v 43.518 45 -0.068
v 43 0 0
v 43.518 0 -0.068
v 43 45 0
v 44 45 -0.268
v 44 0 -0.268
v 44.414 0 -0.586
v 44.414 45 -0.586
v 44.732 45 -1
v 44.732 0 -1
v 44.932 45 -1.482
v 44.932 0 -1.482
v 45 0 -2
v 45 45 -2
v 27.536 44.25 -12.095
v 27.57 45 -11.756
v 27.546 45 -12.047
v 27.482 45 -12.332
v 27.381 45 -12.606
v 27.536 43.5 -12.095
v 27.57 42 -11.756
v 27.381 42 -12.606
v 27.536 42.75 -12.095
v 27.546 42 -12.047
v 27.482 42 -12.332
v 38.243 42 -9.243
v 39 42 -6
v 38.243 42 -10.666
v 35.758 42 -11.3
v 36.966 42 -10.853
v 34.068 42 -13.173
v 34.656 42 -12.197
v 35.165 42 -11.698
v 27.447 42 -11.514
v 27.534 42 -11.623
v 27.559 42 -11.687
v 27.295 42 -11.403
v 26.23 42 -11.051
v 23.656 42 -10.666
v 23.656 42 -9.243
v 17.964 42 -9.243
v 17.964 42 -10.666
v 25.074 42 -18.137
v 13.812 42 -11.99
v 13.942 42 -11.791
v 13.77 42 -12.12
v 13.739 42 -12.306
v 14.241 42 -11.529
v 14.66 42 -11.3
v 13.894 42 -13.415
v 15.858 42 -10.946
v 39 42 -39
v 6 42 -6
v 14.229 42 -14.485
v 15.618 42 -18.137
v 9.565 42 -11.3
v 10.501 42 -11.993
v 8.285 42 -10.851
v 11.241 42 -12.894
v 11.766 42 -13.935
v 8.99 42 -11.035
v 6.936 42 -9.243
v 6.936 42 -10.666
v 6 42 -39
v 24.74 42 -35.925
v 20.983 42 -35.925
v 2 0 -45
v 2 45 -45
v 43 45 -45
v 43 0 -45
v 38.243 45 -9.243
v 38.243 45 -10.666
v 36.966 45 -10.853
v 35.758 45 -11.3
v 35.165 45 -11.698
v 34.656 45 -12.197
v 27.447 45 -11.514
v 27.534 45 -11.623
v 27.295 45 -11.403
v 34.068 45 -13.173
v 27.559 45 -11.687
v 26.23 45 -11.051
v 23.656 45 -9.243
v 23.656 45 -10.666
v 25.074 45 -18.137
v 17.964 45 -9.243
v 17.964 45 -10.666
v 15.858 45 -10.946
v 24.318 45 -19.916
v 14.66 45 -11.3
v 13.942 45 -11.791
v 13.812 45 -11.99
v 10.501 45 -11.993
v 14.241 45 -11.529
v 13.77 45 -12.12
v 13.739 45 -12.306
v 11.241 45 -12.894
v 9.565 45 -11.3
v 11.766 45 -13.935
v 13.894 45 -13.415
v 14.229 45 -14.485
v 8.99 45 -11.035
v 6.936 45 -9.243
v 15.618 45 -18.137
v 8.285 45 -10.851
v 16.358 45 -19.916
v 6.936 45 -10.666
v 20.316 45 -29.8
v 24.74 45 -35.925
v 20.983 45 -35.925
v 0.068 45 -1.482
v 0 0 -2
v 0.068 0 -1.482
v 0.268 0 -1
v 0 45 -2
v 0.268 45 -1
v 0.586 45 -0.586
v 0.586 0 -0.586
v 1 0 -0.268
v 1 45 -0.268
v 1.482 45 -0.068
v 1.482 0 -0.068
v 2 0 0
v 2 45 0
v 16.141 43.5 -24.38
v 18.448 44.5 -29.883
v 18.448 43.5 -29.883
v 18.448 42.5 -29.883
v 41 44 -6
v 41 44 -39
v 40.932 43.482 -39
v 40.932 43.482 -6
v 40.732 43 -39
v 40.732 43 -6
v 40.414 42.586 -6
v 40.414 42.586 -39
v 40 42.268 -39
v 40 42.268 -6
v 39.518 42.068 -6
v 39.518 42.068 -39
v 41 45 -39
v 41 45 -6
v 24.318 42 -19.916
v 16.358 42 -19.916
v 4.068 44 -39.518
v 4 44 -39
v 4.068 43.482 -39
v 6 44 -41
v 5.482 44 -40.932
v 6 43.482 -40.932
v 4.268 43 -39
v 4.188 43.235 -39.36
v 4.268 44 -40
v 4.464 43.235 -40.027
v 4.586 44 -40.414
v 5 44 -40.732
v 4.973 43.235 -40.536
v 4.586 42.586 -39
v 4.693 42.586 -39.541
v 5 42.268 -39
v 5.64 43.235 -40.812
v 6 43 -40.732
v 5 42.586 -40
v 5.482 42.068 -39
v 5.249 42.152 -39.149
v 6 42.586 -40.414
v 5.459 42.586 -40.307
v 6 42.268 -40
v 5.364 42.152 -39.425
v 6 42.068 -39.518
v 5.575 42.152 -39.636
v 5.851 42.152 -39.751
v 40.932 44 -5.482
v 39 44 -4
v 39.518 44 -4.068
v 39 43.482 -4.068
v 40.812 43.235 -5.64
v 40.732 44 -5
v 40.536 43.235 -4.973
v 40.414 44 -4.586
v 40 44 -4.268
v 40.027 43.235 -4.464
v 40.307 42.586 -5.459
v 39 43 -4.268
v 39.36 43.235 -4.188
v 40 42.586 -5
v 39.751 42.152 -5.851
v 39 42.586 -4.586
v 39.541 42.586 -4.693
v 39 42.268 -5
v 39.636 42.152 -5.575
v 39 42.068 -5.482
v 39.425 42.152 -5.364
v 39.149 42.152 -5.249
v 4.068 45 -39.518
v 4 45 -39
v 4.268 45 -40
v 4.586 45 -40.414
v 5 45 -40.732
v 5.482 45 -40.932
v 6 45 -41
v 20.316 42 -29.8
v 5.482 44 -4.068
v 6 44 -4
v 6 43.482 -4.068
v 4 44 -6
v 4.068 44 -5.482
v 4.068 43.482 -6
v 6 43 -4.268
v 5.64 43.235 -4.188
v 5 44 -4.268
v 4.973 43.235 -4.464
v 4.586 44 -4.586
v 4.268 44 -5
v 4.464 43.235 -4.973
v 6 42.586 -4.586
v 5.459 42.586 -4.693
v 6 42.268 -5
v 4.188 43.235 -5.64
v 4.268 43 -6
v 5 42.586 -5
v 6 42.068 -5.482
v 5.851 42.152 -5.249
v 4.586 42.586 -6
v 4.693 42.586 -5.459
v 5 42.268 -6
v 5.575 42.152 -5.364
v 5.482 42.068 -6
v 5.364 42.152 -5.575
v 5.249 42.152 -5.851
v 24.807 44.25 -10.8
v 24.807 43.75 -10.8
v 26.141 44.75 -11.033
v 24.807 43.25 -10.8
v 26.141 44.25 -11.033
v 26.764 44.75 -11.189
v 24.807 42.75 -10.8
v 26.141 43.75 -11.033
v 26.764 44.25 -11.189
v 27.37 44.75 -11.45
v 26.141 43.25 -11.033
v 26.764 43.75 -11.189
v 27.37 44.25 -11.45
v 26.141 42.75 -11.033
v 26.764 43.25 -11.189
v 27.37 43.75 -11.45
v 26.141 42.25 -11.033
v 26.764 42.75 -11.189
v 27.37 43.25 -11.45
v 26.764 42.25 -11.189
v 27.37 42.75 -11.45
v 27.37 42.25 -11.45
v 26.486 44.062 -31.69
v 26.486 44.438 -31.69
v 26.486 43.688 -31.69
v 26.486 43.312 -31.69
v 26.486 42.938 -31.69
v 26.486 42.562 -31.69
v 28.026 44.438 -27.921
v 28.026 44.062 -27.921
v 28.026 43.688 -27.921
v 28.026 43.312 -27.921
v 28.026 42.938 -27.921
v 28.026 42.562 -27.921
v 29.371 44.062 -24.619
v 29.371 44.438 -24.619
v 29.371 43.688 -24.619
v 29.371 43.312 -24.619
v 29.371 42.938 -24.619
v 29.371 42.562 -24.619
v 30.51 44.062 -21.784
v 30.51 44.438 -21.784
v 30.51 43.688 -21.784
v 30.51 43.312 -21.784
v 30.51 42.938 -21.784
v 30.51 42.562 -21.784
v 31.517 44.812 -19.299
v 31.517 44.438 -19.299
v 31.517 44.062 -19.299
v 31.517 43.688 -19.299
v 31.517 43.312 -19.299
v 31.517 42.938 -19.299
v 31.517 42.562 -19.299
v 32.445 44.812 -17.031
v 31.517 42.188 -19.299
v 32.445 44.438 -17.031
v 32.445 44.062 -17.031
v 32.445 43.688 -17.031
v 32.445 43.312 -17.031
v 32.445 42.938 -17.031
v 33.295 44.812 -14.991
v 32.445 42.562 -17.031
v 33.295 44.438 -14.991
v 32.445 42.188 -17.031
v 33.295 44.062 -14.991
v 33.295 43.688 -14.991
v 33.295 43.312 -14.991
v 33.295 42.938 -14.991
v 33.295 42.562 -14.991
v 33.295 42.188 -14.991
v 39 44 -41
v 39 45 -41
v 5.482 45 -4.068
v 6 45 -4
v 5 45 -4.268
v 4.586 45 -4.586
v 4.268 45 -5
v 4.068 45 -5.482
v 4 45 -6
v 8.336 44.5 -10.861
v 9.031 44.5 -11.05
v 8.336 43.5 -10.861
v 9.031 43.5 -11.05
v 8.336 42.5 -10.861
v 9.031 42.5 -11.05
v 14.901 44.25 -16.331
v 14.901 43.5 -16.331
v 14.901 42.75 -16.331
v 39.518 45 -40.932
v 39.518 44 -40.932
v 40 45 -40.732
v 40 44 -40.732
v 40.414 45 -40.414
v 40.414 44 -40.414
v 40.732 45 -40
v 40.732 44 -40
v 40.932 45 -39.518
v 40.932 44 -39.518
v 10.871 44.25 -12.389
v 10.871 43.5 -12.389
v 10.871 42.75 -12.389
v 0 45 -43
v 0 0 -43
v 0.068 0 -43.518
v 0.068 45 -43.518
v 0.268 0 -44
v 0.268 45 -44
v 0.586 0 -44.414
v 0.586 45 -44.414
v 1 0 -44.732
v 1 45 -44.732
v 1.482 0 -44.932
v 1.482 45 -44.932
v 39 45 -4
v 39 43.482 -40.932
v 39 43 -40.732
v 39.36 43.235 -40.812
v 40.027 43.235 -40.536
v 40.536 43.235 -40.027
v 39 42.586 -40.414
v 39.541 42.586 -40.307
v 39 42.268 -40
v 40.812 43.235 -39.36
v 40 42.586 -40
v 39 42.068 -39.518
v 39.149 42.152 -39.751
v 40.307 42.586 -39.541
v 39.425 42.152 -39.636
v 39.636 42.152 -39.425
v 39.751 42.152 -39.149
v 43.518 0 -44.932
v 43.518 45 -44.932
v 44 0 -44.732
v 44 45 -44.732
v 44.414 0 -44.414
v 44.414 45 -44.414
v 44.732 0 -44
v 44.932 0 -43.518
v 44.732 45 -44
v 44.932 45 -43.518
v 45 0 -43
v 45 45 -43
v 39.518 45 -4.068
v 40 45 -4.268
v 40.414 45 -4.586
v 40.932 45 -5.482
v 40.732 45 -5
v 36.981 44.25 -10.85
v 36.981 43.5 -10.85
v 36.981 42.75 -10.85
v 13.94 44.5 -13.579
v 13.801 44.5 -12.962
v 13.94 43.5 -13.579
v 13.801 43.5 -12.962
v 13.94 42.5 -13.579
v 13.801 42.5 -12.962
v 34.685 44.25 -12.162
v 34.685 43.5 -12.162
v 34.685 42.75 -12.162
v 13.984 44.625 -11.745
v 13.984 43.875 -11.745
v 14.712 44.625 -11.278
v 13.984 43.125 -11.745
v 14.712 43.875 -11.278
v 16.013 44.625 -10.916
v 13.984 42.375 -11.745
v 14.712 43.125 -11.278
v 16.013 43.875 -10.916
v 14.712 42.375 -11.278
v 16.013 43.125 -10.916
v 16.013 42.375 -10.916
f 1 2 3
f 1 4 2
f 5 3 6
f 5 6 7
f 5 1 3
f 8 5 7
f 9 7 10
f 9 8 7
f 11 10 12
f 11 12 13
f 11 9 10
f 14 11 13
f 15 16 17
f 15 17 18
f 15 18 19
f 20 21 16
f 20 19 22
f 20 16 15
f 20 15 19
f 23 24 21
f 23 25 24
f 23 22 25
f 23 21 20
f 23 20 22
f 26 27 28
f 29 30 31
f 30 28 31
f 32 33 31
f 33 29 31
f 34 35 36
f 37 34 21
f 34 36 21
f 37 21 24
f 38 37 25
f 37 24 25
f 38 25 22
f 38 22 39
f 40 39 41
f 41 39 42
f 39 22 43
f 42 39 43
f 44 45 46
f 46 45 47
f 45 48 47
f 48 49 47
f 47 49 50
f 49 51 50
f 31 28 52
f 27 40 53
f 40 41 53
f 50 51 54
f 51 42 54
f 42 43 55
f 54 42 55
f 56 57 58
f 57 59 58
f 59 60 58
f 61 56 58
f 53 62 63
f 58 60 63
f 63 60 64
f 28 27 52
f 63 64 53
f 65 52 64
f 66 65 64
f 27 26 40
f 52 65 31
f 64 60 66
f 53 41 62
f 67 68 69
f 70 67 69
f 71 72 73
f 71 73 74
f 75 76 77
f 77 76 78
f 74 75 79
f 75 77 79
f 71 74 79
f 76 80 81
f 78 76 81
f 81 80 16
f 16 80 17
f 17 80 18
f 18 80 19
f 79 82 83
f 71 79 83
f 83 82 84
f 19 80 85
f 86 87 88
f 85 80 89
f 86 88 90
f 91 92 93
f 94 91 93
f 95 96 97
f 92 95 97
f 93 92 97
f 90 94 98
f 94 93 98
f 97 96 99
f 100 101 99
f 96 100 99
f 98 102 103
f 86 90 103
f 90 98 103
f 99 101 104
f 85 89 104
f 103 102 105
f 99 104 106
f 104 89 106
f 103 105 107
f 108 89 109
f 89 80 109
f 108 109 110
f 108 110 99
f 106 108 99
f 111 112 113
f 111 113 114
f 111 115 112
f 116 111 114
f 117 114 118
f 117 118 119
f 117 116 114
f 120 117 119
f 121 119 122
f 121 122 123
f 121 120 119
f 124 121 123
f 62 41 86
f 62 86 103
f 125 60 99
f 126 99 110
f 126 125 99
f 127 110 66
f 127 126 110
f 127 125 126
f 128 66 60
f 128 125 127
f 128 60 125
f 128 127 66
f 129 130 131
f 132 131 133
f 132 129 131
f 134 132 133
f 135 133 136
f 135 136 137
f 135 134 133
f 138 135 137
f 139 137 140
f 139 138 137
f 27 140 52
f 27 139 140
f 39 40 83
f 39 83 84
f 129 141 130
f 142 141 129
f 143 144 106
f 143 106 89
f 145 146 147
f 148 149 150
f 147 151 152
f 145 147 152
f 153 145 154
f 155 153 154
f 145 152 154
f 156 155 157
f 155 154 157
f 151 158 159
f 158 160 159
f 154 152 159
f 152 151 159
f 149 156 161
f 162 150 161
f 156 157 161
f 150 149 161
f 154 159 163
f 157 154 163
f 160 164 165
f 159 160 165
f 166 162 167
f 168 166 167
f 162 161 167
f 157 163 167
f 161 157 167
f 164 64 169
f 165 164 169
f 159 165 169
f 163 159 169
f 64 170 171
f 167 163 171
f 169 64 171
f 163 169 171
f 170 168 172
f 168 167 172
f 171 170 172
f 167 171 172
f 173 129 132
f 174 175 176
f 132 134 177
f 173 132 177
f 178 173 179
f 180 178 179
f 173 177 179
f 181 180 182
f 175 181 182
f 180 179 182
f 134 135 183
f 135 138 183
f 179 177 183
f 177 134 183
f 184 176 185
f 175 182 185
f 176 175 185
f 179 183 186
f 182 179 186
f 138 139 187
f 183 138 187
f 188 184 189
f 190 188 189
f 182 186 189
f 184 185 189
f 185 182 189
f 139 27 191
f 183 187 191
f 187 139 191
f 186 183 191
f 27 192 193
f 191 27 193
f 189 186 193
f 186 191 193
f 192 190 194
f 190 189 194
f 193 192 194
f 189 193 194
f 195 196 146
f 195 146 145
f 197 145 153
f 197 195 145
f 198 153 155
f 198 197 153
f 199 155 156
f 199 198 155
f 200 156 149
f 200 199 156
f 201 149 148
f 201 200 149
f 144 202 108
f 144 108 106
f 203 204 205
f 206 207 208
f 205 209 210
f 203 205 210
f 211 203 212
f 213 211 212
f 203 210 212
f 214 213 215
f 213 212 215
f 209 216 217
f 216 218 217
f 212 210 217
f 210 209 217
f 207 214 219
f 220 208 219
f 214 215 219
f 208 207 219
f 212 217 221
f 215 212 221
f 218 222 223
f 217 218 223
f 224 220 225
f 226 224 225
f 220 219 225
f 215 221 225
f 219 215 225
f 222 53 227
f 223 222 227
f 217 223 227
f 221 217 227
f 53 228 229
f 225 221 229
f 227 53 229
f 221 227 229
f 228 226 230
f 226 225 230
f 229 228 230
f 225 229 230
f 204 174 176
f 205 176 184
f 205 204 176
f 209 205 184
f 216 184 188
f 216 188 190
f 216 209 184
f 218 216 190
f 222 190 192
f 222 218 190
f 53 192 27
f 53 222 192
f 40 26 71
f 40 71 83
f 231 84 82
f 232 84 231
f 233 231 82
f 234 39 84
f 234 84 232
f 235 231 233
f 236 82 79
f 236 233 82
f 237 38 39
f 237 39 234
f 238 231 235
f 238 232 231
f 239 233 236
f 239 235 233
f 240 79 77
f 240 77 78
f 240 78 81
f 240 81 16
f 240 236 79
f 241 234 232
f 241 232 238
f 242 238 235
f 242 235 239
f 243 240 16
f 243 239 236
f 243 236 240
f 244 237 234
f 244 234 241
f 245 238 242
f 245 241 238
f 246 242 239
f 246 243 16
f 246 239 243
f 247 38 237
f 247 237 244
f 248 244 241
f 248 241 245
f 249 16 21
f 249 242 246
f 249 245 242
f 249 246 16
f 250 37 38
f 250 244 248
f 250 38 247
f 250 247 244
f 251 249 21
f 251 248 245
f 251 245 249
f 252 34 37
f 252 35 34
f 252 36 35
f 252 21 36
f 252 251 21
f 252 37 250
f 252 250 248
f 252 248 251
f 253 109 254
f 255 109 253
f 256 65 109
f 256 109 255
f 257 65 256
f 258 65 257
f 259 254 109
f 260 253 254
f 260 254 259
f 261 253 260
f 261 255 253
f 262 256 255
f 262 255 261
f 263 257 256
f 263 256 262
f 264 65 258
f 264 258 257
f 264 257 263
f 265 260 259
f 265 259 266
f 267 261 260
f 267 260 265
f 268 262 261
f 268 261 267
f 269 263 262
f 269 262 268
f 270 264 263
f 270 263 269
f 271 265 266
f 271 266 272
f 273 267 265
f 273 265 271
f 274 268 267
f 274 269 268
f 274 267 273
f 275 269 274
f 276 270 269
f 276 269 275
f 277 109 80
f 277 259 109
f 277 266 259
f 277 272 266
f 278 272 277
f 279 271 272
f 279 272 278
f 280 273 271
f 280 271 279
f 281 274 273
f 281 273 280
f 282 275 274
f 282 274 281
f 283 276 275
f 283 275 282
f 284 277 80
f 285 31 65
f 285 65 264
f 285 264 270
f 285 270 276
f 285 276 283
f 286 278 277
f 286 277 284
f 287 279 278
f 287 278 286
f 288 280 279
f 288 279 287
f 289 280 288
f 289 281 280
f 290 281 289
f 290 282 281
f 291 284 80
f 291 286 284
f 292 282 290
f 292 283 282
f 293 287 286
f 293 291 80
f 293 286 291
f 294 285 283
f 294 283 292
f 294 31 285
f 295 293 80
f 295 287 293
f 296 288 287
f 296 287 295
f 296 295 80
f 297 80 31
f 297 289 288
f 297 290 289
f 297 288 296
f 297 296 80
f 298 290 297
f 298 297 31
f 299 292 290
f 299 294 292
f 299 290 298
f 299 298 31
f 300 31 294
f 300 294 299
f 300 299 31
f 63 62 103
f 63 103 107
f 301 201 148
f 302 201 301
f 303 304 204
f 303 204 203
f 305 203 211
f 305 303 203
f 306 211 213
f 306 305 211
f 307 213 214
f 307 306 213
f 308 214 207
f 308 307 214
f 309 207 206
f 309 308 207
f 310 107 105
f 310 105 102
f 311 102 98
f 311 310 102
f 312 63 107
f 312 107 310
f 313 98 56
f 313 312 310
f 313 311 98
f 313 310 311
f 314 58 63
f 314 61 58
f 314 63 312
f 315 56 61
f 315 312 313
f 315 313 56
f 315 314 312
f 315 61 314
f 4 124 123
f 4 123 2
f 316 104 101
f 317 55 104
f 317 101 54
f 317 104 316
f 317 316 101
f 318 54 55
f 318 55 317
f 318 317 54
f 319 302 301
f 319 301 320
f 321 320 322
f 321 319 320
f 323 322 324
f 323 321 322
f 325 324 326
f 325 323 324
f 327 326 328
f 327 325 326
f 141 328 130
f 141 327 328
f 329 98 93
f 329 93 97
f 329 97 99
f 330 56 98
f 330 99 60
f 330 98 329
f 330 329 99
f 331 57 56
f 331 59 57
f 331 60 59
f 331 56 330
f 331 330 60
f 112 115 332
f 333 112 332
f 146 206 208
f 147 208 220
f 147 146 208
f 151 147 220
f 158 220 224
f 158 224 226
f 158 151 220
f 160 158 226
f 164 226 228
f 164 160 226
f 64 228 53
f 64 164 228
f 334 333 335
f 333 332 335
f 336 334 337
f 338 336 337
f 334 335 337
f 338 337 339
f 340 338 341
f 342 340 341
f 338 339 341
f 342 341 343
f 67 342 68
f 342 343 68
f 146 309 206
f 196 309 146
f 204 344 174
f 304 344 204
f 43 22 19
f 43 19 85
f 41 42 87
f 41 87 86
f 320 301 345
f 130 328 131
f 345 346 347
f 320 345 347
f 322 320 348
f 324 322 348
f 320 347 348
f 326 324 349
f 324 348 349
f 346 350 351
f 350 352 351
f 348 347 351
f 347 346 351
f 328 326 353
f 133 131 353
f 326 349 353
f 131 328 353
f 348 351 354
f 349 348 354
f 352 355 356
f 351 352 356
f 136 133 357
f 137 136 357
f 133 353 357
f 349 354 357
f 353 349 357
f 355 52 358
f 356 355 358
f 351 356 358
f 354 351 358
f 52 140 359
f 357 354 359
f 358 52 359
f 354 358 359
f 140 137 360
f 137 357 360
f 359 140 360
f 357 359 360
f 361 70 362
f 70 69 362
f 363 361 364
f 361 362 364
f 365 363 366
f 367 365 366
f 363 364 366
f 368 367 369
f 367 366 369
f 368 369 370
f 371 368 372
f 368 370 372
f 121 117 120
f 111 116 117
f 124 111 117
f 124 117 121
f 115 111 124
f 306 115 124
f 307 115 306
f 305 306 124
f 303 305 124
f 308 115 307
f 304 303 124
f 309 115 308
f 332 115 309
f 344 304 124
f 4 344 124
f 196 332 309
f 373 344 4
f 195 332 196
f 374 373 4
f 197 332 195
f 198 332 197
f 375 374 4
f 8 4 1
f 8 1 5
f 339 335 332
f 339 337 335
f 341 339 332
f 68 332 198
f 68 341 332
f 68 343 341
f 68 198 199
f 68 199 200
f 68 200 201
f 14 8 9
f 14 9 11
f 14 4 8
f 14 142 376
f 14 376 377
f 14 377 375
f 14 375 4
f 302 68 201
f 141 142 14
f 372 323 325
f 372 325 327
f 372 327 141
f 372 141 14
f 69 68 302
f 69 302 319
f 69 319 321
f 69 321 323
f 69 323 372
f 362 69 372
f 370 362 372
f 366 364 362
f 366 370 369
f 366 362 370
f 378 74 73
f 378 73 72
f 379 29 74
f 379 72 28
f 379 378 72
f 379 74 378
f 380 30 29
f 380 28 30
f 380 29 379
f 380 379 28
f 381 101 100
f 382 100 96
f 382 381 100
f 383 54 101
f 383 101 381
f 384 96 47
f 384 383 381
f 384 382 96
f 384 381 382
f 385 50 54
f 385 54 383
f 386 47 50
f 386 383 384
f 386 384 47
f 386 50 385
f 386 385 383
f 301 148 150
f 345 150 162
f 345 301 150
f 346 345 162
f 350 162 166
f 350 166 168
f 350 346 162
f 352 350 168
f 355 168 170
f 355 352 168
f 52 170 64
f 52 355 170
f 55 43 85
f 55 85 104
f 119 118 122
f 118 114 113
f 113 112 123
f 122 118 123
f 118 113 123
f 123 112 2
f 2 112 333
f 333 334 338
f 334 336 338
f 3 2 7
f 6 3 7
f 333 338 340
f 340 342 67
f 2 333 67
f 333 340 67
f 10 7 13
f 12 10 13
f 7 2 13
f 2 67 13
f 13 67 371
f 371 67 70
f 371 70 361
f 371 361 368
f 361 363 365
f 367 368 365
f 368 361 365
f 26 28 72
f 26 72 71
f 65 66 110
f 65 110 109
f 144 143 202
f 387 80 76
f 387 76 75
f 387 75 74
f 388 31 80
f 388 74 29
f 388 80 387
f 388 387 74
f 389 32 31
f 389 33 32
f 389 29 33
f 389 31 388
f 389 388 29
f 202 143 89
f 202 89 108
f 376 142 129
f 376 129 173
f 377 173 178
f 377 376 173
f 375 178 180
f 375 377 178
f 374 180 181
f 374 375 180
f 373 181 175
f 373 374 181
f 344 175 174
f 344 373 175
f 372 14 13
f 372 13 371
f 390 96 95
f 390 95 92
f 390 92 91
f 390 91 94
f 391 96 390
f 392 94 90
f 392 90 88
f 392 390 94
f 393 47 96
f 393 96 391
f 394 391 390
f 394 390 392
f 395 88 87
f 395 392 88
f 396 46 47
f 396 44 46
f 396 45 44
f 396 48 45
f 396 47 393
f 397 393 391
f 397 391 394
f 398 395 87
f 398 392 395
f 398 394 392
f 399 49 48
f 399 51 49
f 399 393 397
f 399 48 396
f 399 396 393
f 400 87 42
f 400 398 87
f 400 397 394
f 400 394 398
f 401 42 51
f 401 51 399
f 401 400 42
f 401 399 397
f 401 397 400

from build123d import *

# Parameters (mm, degrees)
SKETCH1_W           = 45
SKETCH1_H           = 45
BOSS_EXTRUDE1_DEPTH = 45
CUT_EXTRUDE1_DEPTH  = 3
FILLET1_R           = 2
BOSS_EXTRUDE2_DEPTH = 3
FILLET2_R           = 2
FILLET3_R           = 2


with BuildPart() as part:
    # Sketch1 → Boss-Extrude1 (new body)
    with BuildSketch(Plane(origin=(0, 0, 0), x_dir=(1, 0, 0), z_dir=(0, 1, 0))):
        with Locations((22.5, 22.5)):
            Rectangle(SKETCH1_W, SKETCH1_H)
    extrude(amount=BOSS_EXTRUDE1_DEPTH)

    # Sketch2 → Cut-Extrude1 (cut)
    with BuildSketch(Plane(origin=(0, 45, 0), x_dir=(1, 0, 0), z_dir=(0, 1, 0))):
        with BuildLine():
            Line((6, 41), (39, 41))
            ThreePointArc((39, 41), (40.414213562, 40.414213562), (41, 39))
            Line((41, 39), (41, 6))
            ThreePointArc((41, 6), (40.414213562, 4.585786438), (39, 4))
            Line((39, 4), (6, 4))
            ThreePointArc((6, 4), (4.585786438, 4.585786438), (4, 6))
            Line((4, 6), (4, 39))
            ThreePointArc((4, 39), (4.585786438, 40.414213562), (6, 41))
        make_face()
    extrude(amount=-CUT_EXTRUDE1_DEPTH, mode=Mode.SUBTRACT)

    # Fillet1
    fillet1_edges = [part.edges().sort_by_distance(p)[0] for p in [
        (40.414213562, 42, -40.414213562),
        (41, 42, -22.5),
        (40.414213562, 42, -4.585786438),
        (22.5, 42, -4),
        (4.585786438, 42, -4.585786438),
        (4, 42, -22.5),
        (4.585786438, 42, -40.414213562),
        (22.5, 42, -41),
    ]]
    fillet(fillet1_edges, radius=FILLET1_R)

    # Sketch3 → Boss-Extrude2 (add)
    with BuildSketch(Plane(origin=(0, 42, 0), x_dir=(1, 0, 0), z_dir=(0, 1, 0))):
        with BuildLine():
            Line((38.242693353, 9.243196233), (23.656388738, 9.243196233))
            Line((23.656388738, 9.243196233), (23.656388738, 10.666250342))
            add(Edge.make_bspline(
                [(23.656388738, 10.666250342), (23.840076099, 10.68078989), (24.225242332, 10.711277253), (24.822230957, 10.802993535), (25.469379926, 10.895689338), (26.022940834, 11.010248275), (26.463008214, 11.096809674), (26.751861609, 11.185019051), (27.001950694, 11.262002653), (27.202632415, 11.353541525), (27.365753511, 11.438699124), (27.476844631, 11.539421658), (27.55548257, 11.642841951), (27.565194032, 11.719511547), (27.569787537, 11.755776144)],
                knots=[0, 0, 0, 0, 1.580663375, 3.314425972, 5.180984338, 7.189265601, 8.165445891, 9.025996966, 9.780234646, 10.406650621, 10.91943364, 11.347278432, 11.691263739, 12, 12, 12, 12], degree=3))
            add(Edge.make_bspline(
                [(27.569787537, 11.755776144), (27.569435107, 11.809650716), (27.568689302, 11.923658657), (27.533827132, 12.110664377), (27.487076537, 12.345104426), (27.419571412, 12.510976182), (27.380788164, 12.606273326)],
                knots=[0, 0, 0, 0, 0.735694078, 1.556856296, 2.596357679, 4, 4, 4, 4], degree=3))
            Line((27.380788164, 12.606273326), (25.073884042, 18.137284413))
            Line((25.073884042, 18.137284413), (15.618356546, 18.137284413))
            add(Edge.make_bspline(
                [(15.618356546, 18.137284413), (15.504836551, 17.857690943), (15.261095281, 17.257369675), (14.897005839, 16.330696191), (14.552517174, 15.390865424), (14.332060663, 14.774334183), (14.228655267, 14.485149454)],
                knots=[0, 0, 0, 0, 0.926583958, 1.989488725, 3.056967239, 4, 4, 4, 4], degree=3))
            add(Edge.make_bspline(
                [(14.228655267, 14.485149454), (14.174323811, 14.322282922), (14.073992132, 14.021523953), (13.944497555, 13.605517058), (13.852124744, 13.261079178), (13.790356149, 12.921159244), (13.757506332, 12.61062748), (13.744527557, 12.391364177), (13.739480418, 12.30609785)],
                knots=[0, 0, 0, 0, 1.377792625, 2.544313332, 3.496463908, 4.237287142, 5.314522549, 6, 6, 6, 6], degree=3))
            add(Edge.make_bspline(
                [(13.739480418, 12.30609785), (13.752275343, 12.20703328), (13.779291631, 11.997859957), (13.987544963, 11.717644303), (14.302946626, 11.47080153), (14.743758449, 11.250468253), (15.325360636, 11.057952059), (16.061834345, 10.898701284), (16.958602595, 10.761686661), (17.611688564, 10.699703767), (17.964172303, 10.666250342)],
                knots=[0, 0, 0, 0, 0.491092674, 1.036934666, 1.680532576, 2.482252872, 3.47863382, 4.729366136, 6.234772593, 8, 8, 8, 8], degree=3))
            Line((17.964172303, 10.666250342), (17.964172303, 9.243196233))
            Line((17.964172303, 9.243196233), (6.93550296, 9.243196233))
            Line((6.93550296, 9.243196233), (6.93550296, 10.666250342))
            add(Edge.make_bspline(
                [(6.93550296, 10.666250342), (7.156458841, 10.68507928), (7.626766221, 10.725156912), (8.214255419, 10.83449568), (8.694916504, 10.934535131), (9.021428402, 11.044189086), (9.31379367, 11.154502307), (9.484333571, 11.253318866), (9.564817778, 11.299954125)],
                knots=[0, 0, 0, 0, 1.463204883, 3.114450051, 3.942471061, 4.700769028, 5.386843935, 6, 6, 6, 6], degree=3))
            add(Edge.make_bspline(
                [(9.564817778, 11.299954125), (9.808806898, 11.456132653), (10.289617679, 11.763901787), (10.894760398, 12.38121249), (11.401516748, 13.103822817), (11.641967893, 13.651883003), (11.766104603, 13.934827748)],
                knots=[0, 0, 0, 0, 0.990620078, 1.952139562, 2.94275964, 4, 4, 4, 4], degree=3))
            add(Edge.make_bspline(
                [(11.766104603, 13.934827748), (12.49384773, 15.674926569), (13.950269602, 19.157361354), (15.787937069, 23.531851641), (17.281093989, 27.110474834), (18.468273477, 29.928542487), (19.704638443, 32.883483751), (20.55061589, 34.89718826), (20.982603479, 35.925460773)],
                knots=[0, 0, 0, 0, 1.423871405, 2.8495734, 3.581899029, 4.351134106, 5.15802767, 6, 6, 6, 6], degree=3))
            Line((20.982603479, 35.925460773), (24.740355735, 35.925460773))
            add(Edge.make_bspline(
                [(24.740355735, 35.925460773), (25.037951878, 35.198811204), (25.616719472, 33.785616739), (26.473021768, 31.729065196), (27.262884583, 29.784355708), (28.012276259, 27.959201793), (28.701657163, 26.247813786), (29.358282986, 24.658333454), (29.948553903, 23.180808533), (30.499990304, 21.811943928), (31.011657569, 20.529416983), (31.511007395, 19.316516594), (31.980152709, 18.154453259), (32.436507788, 17.051074697), (32.870912199, 16.001880065), (33.286642483, 15.010835315), (33.682273223, 14.072862205), (33.941746737, 13.467767085), (34.068030714, 13.173271448)],
                knots=[0, 0, 0, 0, 1.532752056, 2.980909665, 4.348409991, 5.629937521, 6.832191988, 7.949838466, 8.98685575, 9.937901843, 10.830515139, 11.682178711, 12.498237346, 13.276712205, 14.012891946, 14.714850756, 15.374526692, 16, 16, 16, 16], degree=3))
            add(Edge.make_bspline(
                [(34.068030714, 13.173271448), (34.156473839, 12.994922089), (34.332453747, 12.640051048), (34.679517564, 12.137203398), (35.154116348, 11.674345926), (35.54643409, 11.431082086), (35.757907468, 11.299954125)],
                knots=[0, 0, 0, 0, 0.929211814, 1.848901312, 2.840480417, 4, 4, 4, 4], degree=3))
            add(Edge.make_bspline(
                [(35.757907468, 11.299954125), (35.94634352, 11.206794224), (36.337568372, 11.013378643), (36.978994102, 10.838934171), (37.620953448, 10.729278261), (38.044146103, 10.686377762), (38.242693353, 10.666250342)],
                knots=[0, 0, 0, 0, 0.974847381, 2.023946679, 3.072904627, 4, 4, 4, 4], degree=3))
            Line((38.242693353, 10.666250342), (38.242693353, 9.243196233))
        make_face()
        Polygon((24.317886547, 19.916102049), (20.315546866, 29.799657539), (16.357677626, 19.916102049), align=None, mode=Mode.SUBTRACT)
    extrude(amount=BOSS_EXTRUDE2_DEPTH)

    # Fillet2
    fillet2_edges = [part.edges().sort_by_distance(p)[0] for p in [
        (45, 22.5, -45),
        (45, 22.5, 0),
        (0, 22.5, 0),
    ]]
    fillet(fillet2_edges, radius=FILLET2_R)

    # Fillet3
    fillet3_edges = [part.edges().sort_by_distance(p)[0] for p in [
        (0, 22.5, -45),
    ]]
    fillet(fillet3_edges, radius=FILLET3_R)


solid = part.part
